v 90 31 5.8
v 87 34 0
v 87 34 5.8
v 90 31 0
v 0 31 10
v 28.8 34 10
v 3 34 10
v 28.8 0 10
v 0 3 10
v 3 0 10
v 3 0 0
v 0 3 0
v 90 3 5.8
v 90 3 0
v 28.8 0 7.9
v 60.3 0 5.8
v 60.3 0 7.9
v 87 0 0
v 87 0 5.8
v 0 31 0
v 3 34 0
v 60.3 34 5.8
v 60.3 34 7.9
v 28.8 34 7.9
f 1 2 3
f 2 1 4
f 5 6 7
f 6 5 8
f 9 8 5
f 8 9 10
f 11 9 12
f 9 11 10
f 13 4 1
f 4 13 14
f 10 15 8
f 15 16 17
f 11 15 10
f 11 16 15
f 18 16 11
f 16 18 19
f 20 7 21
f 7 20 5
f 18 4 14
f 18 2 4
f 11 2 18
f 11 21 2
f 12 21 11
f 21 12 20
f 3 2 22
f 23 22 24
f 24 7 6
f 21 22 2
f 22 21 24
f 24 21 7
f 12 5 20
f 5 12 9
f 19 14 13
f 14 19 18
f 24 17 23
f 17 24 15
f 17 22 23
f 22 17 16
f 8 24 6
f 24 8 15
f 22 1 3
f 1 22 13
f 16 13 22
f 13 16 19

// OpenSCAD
$fn = 32;

// ----------------------------------------------------------------------
// Stepped bar: twostep, 90 x 34 x 10/5.8 mm
// ----------------------------------------------------------------------

// --- parameters (mm) ---
bar_l = 90;               // bar length, X
bar_w = 34;               // bar width, Y
plate_t = 10;             // thickness of the thick zone, Z
thin_t = 5.8;             // thickness of the thin zone
corner_c = 3;             // corner chamfer of the bar
step_cut = 4.2;           // material removed from the thin zone
stair1_x = 28.8;          // position of the first stair
stair2_x = 60.3;          // position of the second stair
mid_t = 7.9;              // thickness of the middle zone
depth_1 = 2.1;            // depth of cut 1 from the top face
depth_2 = 4.2;            // depth of cut 2 from the top face

profile = [[3, 0], [87, 0], [90, 3], [90, 31], [87, 34], [3, 34], [0, 31], [0, 3]];  // primary outline, 8 points, counter clockwise
void_1 = [[28.8, -1], [60.3, -1], [60.3, 35], [28.8, 35]];  // first stair, 4 points
void_2 = [[60.3, -1], [91, -1], [91, 35], [60.3, 35]];  // second stair, 4 points

// --- the one profile operation ---
difference() {
  linear_extrude(height = plate_t) polygon(points = profile);
  translate([0, 0, plate_t - depth_1])
    linear_extrude(height = depth_1 + 1) polygon(points = void_1);
  translate([0, 0, plate_t - depth_2])
    linear_extrude(height = depth_2 + 1) polygon(points = void_2);
}
